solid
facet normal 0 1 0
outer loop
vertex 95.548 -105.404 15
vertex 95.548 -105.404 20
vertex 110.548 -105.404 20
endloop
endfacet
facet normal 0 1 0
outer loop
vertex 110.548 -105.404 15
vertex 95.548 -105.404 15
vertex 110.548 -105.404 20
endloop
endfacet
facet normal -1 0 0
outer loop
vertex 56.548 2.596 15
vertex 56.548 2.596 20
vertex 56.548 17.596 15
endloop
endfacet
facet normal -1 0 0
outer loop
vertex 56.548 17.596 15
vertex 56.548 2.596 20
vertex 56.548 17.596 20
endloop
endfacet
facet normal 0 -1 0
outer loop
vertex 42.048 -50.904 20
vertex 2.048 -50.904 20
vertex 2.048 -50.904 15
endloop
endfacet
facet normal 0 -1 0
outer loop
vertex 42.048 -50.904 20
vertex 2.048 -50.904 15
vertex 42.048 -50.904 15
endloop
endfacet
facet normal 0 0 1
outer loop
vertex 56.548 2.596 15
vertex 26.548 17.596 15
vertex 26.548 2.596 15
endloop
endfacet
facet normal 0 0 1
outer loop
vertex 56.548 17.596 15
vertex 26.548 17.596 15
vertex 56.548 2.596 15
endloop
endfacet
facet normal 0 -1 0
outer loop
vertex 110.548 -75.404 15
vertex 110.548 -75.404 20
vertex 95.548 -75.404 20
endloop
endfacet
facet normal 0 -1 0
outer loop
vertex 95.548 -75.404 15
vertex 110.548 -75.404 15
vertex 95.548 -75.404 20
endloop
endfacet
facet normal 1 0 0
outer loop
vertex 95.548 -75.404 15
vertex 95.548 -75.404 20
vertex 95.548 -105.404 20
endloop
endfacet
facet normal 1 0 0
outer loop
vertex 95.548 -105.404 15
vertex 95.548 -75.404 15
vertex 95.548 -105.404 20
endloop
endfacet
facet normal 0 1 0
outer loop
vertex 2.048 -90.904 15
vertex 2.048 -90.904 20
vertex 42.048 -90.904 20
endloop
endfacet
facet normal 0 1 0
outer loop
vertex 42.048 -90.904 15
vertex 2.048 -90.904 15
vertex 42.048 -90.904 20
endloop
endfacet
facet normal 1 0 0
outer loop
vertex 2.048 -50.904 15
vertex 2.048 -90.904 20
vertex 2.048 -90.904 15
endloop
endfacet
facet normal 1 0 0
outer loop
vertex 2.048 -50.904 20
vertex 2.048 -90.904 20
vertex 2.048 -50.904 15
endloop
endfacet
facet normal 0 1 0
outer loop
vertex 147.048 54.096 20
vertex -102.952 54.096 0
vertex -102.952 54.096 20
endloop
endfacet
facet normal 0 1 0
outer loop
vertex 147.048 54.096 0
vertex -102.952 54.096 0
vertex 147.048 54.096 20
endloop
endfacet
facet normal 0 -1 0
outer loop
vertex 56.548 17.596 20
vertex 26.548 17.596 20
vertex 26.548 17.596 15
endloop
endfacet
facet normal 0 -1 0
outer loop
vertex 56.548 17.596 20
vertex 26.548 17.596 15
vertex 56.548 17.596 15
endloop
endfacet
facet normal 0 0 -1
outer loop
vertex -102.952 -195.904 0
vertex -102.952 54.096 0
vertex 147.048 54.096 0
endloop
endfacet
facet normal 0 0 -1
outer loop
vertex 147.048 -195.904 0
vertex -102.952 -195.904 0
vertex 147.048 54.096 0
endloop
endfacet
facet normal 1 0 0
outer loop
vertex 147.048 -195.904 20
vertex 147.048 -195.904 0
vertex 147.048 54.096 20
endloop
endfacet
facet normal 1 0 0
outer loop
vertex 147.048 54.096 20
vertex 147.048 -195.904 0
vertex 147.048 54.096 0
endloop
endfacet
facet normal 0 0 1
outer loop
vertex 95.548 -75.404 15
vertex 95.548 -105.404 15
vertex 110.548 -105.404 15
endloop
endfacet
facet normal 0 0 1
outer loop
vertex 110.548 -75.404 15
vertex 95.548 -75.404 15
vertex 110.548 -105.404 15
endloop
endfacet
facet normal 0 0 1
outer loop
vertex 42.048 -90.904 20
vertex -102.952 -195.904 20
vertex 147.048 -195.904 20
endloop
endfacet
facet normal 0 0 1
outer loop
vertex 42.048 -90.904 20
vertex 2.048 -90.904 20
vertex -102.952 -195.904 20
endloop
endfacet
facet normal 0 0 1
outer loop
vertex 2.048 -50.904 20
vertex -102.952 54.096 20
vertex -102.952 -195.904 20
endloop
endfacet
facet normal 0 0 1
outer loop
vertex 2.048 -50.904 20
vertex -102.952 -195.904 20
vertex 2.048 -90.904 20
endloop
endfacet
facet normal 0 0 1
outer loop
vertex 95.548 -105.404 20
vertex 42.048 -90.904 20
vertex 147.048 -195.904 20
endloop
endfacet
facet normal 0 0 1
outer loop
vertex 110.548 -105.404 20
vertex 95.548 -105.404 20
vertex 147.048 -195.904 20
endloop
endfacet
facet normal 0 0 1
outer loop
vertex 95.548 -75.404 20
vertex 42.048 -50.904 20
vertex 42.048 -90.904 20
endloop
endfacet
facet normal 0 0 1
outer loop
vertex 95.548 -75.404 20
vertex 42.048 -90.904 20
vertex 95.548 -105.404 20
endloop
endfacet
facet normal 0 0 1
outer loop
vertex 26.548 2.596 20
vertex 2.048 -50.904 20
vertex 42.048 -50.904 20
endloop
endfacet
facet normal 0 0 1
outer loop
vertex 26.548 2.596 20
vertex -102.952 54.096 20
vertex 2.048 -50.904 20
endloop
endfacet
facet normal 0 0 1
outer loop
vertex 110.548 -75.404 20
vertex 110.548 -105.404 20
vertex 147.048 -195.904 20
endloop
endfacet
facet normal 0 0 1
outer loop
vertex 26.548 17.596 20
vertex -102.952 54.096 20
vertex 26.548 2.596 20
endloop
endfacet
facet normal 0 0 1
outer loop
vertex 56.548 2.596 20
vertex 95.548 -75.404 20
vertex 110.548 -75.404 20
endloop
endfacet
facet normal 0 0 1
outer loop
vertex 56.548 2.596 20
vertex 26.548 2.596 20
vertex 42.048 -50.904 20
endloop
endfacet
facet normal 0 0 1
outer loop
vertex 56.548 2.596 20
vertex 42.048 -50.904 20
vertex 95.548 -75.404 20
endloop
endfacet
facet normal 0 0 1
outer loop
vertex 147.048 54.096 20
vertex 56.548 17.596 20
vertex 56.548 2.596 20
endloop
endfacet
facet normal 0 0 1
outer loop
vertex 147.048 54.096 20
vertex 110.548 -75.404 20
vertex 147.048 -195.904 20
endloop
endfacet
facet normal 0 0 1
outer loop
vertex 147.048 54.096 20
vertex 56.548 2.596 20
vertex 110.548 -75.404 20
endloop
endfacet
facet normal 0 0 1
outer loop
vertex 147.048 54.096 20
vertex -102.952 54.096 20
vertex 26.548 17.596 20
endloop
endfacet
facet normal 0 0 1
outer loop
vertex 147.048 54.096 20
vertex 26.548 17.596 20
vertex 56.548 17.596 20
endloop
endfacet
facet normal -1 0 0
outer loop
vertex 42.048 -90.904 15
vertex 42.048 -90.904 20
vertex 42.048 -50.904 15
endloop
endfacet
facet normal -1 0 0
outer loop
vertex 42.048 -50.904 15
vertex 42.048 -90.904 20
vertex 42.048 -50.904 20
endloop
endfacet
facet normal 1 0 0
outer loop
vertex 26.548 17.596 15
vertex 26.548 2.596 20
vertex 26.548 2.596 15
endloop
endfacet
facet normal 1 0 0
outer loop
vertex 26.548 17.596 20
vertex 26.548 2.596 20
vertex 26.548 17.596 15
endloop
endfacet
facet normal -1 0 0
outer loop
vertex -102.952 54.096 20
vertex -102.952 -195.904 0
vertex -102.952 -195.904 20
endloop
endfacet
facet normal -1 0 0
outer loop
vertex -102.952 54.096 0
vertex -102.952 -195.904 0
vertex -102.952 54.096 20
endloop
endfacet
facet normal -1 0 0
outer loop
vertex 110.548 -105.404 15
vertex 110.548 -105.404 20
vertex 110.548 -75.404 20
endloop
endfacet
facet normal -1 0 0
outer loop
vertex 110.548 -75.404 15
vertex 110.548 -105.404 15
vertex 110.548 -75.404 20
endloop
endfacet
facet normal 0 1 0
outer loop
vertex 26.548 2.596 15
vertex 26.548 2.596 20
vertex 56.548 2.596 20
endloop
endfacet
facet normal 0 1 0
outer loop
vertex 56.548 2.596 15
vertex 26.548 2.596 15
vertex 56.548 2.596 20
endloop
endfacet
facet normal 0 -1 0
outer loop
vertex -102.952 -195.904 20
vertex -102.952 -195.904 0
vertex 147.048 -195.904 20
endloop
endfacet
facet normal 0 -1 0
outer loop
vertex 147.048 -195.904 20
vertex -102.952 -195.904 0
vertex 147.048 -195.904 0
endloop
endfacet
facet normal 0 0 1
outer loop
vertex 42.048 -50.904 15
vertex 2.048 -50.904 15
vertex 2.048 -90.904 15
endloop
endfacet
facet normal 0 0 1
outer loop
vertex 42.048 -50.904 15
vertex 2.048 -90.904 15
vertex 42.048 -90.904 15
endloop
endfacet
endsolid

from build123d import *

# Parameters (mm, degrees)
SKETCH1_W           = 250
SKETCH1_H           = 250
BOSS_EXTRUDE1_DEPTH = 20
SKETCH2_W           = 40
SKETCH2_H           = 40
SKETCH2_W_2         = 30
SKETCH2_H_2         = 15
CUT_EXTRUDE2_DEPTH  = 5


with BuildPart() as part:
    # Sketch1 → Boss-Extrude1 (new body)
    with BuildSketch(Plane.XY):
        with Locations((22.048407602, -70.903707865)):
            Rectangle(SKETCH1_W, SKETCH1_H)
    extrude(amount=BOSS_EXTRUDE1_DEPTH)

    # Sketch2 → Cut-Extrude2 (cut)
    with BuildSketch(Plane.XY.offset(20)):
        Polygon((95.548407602, -105.403707865), (110.548407602, -105.403707865), (110.548407602, -90.403707865), (110.548407602, -75.403707865), (95.548407602, -75.403707865), align=None)
        with Locations((22.048407602, -70.903707865)):
            Rectangle(SKETCH2_W, SKETCH2_H)
        with Locations((41.548407602, 10.096292135)):
            Rectangle(SKETCH2_W_2, SKETCH2_H_2)
    extrude(amount=-CUT_EXTRUDE2_DEPTH, mode=Mode.SUBTRACT)


solid = part.part
